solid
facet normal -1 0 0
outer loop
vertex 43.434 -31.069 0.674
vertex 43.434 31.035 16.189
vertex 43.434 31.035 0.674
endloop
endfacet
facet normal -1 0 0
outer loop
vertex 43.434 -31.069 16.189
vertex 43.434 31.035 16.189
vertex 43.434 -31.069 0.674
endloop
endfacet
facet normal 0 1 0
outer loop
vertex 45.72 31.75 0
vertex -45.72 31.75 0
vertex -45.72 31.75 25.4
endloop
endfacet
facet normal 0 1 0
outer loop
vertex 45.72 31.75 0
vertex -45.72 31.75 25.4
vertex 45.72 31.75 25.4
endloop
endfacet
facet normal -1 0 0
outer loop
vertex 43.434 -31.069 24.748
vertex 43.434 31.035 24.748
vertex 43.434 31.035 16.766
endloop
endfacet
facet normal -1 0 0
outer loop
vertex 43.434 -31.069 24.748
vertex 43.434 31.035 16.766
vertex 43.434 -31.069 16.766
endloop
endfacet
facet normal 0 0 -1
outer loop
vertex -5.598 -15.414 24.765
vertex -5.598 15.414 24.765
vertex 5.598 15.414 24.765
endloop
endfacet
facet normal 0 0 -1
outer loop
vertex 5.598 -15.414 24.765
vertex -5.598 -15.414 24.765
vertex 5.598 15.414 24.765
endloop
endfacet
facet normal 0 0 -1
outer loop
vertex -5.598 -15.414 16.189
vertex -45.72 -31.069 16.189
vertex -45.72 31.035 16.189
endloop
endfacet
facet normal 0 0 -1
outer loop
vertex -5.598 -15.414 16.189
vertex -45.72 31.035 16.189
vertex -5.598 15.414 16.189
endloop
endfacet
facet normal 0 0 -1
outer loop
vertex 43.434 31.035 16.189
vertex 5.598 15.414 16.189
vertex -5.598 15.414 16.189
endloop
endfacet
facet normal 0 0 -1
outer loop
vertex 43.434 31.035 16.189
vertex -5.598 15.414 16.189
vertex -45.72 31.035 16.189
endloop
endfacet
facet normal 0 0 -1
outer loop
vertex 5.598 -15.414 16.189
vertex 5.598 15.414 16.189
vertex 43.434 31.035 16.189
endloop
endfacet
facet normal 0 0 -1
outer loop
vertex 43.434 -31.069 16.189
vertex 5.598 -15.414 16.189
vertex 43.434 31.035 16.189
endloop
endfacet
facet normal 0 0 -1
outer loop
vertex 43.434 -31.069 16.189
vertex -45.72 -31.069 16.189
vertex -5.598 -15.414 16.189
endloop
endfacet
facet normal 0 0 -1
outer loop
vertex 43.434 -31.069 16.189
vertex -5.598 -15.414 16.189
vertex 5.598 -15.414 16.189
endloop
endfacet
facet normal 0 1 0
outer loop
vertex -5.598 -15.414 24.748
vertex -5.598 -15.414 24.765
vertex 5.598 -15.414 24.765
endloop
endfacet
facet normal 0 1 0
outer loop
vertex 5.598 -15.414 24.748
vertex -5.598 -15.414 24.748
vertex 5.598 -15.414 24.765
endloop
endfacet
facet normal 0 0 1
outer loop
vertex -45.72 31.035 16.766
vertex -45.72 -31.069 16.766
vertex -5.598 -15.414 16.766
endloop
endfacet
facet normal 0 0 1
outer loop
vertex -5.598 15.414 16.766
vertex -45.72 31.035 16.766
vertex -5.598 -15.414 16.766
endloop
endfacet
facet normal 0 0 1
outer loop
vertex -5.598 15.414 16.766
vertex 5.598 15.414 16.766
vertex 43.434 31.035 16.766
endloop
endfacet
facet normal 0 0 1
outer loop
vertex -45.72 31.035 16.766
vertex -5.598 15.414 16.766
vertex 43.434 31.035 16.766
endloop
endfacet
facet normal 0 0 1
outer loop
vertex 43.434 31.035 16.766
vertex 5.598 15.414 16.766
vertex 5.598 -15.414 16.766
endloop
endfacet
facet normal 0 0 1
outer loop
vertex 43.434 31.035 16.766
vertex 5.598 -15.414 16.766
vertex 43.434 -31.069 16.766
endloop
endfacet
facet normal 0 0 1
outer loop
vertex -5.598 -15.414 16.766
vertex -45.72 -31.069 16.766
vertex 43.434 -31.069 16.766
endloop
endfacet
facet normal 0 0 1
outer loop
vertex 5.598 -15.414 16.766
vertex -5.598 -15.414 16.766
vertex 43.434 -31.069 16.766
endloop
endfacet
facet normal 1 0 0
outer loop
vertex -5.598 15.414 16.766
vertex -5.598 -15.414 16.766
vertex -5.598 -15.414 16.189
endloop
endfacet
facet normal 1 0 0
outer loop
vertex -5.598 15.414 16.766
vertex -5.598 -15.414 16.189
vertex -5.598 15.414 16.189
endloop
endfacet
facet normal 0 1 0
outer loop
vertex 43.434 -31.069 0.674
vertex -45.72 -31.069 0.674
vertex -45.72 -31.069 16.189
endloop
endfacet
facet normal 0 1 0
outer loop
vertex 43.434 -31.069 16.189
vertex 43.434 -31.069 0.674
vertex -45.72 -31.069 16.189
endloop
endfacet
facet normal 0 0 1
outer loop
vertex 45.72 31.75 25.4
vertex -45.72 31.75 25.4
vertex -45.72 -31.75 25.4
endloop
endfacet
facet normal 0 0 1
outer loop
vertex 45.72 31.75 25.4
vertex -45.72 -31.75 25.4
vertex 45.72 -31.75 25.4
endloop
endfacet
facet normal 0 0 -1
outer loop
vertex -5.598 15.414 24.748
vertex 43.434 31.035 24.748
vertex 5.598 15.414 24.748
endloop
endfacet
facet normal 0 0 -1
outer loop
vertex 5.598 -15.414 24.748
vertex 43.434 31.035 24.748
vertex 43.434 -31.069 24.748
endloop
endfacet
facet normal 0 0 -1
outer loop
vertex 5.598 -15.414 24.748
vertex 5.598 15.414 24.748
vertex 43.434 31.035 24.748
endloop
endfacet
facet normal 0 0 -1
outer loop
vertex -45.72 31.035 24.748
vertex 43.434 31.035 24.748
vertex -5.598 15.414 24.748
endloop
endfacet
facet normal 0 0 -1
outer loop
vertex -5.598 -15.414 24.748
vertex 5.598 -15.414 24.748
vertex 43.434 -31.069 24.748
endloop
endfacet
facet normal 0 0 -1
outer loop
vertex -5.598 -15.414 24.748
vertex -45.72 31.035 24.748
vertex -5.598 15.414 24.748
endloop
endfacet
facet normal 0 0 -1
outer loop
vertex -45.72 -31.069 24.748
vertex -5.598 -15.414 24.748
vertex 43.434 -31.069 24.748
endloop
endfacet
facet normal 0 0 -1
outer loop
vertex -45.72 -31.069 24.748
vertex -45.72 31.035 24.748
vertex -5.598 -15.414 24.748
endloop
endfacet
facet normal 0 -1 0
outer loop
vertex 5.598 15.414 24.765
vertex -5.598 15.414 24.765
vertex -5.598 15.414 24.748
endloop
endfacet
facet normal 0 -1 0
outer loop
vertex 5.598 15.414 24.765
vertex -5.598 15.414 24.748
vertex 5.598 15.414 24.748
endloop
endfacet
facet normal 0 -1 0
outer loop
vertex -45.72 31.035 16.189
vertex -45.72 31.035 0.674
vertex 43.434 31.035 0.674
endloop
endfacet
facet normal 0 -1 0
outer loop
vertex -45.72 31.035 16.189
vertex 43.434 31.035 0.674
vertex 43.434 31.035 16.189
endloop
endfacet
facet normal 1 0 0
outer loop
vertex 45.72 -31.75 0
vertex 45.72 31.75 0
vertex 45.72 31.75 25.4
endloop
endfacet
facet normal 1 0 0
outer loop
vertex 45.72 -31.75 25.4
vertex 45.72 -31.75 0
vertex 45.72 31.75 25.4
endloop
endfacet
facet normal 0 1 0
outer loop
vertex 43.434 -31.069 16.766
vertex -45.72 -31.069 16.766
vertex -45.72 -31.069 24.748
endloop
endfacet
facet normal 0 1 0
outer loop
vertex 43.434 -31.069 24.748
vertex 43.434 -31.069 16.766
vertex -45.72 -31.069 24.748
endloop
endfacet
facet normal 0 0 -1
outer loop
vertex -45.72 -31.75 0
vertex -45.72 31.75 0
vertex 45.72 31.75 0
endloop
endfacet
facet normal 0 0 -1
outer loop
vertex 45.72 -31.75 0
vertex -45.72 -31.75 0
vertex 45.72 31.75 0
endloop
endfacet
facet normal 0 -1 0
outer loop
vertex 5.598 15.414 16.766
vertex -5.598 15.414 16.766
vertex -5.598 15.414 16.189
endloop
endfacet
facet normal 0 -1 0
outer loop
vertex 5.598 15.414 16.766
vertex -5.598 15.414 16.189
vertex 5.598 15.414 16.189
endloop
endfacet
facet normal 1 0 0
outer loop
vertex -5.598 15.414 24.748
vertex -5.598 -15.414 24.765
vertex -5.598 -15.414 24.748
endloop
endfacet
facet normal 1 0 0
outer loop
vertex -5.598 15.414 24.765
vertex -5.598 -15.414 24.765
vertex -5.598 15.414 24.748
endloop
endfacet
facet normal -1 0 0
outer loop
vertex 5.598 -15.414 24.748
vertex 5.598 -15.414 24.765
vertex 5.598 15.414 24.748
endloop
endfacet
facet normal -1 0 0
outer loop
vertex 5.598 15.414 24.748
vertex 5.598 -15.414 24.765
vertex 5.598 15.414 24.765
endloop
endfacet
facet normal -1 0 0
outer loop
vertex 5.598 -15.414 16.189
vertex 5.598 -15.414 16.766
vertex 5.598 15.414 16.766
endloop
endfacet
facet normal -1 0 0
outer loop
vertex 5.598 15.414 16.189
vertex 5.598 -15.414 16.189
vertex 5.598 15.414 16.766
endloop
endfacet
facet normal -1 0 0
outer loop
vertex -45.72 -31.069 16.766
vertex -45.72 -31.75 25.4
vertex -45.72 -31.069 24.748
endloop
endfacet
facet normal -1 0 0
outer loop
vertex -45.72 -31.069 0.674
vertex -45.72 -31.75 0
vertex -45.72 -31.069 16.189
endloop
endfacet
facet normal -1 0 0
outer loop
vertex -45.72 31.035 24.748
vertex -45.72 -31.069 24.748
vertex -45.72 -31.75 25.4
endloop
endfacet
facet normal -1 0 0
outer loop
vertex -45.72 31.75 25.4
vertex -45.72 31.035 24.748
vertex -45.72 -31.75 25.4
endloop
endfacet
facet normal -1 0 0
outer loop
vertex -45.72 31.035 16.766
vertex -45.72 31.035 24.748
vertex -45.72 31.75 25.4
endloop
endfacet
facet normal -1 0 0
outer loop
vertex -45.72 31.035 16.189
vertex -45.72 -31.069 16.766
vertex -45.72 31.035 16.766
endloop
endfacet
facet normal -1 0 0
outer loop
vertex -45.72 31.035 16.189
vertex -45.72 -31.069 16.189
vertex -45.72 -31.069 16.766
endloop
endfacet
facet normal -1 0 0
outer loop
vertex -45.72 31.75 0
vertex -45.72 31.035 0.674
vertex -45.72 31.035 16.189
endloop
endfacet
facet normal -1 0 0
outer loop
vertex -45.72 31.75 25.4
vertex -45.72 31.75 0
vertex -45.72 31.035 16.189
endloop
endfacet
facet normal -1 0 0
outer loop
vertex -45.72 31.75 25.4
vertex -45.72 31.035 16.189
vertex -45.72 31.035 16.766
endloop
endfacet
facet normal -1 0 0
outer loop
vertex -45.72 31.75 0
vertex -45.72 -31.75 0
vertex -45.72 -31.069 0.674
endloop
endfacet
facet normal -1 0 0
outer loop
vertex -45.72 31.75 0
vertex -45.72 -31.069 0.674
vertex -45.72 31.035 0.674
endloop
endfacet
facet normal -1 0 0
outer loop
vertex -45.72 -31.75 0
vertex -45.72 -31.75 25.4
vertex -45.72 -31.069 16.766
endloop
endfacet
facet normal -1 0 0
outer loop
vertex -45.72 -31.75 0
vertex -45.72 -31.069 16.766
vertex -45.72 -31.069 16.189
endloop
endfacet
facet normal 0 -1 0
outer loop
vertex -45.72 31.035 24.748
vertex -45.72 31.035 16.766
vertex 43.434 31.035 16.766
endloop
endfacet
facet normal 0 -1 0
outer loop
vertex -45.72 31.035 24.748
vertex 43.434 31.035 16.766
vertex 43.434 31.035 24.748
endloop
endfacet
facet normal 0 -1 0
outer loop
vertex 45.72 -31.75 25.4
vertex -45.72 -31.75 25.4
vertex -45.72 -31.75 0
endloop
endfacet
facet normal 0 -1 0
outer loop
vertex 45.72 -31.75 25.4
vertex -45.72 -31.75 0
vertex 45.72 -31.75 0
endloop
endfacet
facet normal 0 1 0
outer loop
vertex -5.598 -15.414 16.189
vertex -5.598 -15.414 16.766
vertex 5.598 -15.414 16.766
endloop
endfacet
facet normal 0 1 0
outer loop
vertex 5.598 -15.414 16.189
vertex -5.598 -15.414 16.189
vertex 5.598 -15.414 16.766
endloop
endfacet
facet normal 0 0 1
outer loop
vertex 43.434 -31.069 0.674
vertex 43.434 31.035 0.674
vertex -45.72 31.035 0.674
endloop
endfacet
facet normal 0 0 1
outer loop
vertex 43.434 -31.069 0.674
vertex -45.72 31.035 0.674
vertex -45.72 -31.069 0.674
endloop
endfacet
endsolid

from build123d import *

# Parameters (mm, degrees)
F0_W      = 91.44
F0_H      = 63.5
F1_DEPTH  = 25.4
F3_W      = 62.104847
F3_H      = 24.073936
F4_DEPTH  = 89.154
F5_W      = 91.44
F5_H      = 0.576332
F6_DEPTH  = 63.2206
F7_W      = 11.196822
F7_H      = 30.827232
F8_DEPTH  = 15.24
F9_W      = 11.196822
F9_H      = 30.827232
F10_DEPTH = 0.635


with BuildPart() as f1:
    # F0 (on Top) → F1 (new body)
    with BuildSketch(Plane.XY):
        Rectangle(F0_W, F0_H)
    extrude(amount=F1_DEPTH)

    # F3 (on face) → F4 (cut)
    with BuildSketch(Plane(origin=(-45.72, 0, 0), x_dir=(0, -1, 0), z_dir=(-1, 0, 0))):
        with Locations((0.017024, 12.710826)):
            Rectangle(F3_W, F3_H)
    extrude(amount=-F4_DEPTH, mode=Mode.SUBTRACT)

    # F5 (on face) → F6 (join)
    with BuildSketch(Plane.XZ.offset(31.75)):
        with Locations((0, 16.477615)):
            Rectangle(F5_W, F5_H)
    extrude(amount=-F6_DEPTH)

    # F7 (on face) → F8 (cut)
    with BuildSketch(Plane.XY.offset(25.4)):
        Rectangle(F7_W, F7_H)
    extrude(amount=-F8_DEPTH, mode=Mode.SUBTRACT)

    # F9 (on face) → F10 (join)
    with BuildSketch(Plane.XY.offset(25.4)):
        Rectangle(F9_W, F9_H)
    extrude(amount=-F10_DEPTH)


solid = f1.part
